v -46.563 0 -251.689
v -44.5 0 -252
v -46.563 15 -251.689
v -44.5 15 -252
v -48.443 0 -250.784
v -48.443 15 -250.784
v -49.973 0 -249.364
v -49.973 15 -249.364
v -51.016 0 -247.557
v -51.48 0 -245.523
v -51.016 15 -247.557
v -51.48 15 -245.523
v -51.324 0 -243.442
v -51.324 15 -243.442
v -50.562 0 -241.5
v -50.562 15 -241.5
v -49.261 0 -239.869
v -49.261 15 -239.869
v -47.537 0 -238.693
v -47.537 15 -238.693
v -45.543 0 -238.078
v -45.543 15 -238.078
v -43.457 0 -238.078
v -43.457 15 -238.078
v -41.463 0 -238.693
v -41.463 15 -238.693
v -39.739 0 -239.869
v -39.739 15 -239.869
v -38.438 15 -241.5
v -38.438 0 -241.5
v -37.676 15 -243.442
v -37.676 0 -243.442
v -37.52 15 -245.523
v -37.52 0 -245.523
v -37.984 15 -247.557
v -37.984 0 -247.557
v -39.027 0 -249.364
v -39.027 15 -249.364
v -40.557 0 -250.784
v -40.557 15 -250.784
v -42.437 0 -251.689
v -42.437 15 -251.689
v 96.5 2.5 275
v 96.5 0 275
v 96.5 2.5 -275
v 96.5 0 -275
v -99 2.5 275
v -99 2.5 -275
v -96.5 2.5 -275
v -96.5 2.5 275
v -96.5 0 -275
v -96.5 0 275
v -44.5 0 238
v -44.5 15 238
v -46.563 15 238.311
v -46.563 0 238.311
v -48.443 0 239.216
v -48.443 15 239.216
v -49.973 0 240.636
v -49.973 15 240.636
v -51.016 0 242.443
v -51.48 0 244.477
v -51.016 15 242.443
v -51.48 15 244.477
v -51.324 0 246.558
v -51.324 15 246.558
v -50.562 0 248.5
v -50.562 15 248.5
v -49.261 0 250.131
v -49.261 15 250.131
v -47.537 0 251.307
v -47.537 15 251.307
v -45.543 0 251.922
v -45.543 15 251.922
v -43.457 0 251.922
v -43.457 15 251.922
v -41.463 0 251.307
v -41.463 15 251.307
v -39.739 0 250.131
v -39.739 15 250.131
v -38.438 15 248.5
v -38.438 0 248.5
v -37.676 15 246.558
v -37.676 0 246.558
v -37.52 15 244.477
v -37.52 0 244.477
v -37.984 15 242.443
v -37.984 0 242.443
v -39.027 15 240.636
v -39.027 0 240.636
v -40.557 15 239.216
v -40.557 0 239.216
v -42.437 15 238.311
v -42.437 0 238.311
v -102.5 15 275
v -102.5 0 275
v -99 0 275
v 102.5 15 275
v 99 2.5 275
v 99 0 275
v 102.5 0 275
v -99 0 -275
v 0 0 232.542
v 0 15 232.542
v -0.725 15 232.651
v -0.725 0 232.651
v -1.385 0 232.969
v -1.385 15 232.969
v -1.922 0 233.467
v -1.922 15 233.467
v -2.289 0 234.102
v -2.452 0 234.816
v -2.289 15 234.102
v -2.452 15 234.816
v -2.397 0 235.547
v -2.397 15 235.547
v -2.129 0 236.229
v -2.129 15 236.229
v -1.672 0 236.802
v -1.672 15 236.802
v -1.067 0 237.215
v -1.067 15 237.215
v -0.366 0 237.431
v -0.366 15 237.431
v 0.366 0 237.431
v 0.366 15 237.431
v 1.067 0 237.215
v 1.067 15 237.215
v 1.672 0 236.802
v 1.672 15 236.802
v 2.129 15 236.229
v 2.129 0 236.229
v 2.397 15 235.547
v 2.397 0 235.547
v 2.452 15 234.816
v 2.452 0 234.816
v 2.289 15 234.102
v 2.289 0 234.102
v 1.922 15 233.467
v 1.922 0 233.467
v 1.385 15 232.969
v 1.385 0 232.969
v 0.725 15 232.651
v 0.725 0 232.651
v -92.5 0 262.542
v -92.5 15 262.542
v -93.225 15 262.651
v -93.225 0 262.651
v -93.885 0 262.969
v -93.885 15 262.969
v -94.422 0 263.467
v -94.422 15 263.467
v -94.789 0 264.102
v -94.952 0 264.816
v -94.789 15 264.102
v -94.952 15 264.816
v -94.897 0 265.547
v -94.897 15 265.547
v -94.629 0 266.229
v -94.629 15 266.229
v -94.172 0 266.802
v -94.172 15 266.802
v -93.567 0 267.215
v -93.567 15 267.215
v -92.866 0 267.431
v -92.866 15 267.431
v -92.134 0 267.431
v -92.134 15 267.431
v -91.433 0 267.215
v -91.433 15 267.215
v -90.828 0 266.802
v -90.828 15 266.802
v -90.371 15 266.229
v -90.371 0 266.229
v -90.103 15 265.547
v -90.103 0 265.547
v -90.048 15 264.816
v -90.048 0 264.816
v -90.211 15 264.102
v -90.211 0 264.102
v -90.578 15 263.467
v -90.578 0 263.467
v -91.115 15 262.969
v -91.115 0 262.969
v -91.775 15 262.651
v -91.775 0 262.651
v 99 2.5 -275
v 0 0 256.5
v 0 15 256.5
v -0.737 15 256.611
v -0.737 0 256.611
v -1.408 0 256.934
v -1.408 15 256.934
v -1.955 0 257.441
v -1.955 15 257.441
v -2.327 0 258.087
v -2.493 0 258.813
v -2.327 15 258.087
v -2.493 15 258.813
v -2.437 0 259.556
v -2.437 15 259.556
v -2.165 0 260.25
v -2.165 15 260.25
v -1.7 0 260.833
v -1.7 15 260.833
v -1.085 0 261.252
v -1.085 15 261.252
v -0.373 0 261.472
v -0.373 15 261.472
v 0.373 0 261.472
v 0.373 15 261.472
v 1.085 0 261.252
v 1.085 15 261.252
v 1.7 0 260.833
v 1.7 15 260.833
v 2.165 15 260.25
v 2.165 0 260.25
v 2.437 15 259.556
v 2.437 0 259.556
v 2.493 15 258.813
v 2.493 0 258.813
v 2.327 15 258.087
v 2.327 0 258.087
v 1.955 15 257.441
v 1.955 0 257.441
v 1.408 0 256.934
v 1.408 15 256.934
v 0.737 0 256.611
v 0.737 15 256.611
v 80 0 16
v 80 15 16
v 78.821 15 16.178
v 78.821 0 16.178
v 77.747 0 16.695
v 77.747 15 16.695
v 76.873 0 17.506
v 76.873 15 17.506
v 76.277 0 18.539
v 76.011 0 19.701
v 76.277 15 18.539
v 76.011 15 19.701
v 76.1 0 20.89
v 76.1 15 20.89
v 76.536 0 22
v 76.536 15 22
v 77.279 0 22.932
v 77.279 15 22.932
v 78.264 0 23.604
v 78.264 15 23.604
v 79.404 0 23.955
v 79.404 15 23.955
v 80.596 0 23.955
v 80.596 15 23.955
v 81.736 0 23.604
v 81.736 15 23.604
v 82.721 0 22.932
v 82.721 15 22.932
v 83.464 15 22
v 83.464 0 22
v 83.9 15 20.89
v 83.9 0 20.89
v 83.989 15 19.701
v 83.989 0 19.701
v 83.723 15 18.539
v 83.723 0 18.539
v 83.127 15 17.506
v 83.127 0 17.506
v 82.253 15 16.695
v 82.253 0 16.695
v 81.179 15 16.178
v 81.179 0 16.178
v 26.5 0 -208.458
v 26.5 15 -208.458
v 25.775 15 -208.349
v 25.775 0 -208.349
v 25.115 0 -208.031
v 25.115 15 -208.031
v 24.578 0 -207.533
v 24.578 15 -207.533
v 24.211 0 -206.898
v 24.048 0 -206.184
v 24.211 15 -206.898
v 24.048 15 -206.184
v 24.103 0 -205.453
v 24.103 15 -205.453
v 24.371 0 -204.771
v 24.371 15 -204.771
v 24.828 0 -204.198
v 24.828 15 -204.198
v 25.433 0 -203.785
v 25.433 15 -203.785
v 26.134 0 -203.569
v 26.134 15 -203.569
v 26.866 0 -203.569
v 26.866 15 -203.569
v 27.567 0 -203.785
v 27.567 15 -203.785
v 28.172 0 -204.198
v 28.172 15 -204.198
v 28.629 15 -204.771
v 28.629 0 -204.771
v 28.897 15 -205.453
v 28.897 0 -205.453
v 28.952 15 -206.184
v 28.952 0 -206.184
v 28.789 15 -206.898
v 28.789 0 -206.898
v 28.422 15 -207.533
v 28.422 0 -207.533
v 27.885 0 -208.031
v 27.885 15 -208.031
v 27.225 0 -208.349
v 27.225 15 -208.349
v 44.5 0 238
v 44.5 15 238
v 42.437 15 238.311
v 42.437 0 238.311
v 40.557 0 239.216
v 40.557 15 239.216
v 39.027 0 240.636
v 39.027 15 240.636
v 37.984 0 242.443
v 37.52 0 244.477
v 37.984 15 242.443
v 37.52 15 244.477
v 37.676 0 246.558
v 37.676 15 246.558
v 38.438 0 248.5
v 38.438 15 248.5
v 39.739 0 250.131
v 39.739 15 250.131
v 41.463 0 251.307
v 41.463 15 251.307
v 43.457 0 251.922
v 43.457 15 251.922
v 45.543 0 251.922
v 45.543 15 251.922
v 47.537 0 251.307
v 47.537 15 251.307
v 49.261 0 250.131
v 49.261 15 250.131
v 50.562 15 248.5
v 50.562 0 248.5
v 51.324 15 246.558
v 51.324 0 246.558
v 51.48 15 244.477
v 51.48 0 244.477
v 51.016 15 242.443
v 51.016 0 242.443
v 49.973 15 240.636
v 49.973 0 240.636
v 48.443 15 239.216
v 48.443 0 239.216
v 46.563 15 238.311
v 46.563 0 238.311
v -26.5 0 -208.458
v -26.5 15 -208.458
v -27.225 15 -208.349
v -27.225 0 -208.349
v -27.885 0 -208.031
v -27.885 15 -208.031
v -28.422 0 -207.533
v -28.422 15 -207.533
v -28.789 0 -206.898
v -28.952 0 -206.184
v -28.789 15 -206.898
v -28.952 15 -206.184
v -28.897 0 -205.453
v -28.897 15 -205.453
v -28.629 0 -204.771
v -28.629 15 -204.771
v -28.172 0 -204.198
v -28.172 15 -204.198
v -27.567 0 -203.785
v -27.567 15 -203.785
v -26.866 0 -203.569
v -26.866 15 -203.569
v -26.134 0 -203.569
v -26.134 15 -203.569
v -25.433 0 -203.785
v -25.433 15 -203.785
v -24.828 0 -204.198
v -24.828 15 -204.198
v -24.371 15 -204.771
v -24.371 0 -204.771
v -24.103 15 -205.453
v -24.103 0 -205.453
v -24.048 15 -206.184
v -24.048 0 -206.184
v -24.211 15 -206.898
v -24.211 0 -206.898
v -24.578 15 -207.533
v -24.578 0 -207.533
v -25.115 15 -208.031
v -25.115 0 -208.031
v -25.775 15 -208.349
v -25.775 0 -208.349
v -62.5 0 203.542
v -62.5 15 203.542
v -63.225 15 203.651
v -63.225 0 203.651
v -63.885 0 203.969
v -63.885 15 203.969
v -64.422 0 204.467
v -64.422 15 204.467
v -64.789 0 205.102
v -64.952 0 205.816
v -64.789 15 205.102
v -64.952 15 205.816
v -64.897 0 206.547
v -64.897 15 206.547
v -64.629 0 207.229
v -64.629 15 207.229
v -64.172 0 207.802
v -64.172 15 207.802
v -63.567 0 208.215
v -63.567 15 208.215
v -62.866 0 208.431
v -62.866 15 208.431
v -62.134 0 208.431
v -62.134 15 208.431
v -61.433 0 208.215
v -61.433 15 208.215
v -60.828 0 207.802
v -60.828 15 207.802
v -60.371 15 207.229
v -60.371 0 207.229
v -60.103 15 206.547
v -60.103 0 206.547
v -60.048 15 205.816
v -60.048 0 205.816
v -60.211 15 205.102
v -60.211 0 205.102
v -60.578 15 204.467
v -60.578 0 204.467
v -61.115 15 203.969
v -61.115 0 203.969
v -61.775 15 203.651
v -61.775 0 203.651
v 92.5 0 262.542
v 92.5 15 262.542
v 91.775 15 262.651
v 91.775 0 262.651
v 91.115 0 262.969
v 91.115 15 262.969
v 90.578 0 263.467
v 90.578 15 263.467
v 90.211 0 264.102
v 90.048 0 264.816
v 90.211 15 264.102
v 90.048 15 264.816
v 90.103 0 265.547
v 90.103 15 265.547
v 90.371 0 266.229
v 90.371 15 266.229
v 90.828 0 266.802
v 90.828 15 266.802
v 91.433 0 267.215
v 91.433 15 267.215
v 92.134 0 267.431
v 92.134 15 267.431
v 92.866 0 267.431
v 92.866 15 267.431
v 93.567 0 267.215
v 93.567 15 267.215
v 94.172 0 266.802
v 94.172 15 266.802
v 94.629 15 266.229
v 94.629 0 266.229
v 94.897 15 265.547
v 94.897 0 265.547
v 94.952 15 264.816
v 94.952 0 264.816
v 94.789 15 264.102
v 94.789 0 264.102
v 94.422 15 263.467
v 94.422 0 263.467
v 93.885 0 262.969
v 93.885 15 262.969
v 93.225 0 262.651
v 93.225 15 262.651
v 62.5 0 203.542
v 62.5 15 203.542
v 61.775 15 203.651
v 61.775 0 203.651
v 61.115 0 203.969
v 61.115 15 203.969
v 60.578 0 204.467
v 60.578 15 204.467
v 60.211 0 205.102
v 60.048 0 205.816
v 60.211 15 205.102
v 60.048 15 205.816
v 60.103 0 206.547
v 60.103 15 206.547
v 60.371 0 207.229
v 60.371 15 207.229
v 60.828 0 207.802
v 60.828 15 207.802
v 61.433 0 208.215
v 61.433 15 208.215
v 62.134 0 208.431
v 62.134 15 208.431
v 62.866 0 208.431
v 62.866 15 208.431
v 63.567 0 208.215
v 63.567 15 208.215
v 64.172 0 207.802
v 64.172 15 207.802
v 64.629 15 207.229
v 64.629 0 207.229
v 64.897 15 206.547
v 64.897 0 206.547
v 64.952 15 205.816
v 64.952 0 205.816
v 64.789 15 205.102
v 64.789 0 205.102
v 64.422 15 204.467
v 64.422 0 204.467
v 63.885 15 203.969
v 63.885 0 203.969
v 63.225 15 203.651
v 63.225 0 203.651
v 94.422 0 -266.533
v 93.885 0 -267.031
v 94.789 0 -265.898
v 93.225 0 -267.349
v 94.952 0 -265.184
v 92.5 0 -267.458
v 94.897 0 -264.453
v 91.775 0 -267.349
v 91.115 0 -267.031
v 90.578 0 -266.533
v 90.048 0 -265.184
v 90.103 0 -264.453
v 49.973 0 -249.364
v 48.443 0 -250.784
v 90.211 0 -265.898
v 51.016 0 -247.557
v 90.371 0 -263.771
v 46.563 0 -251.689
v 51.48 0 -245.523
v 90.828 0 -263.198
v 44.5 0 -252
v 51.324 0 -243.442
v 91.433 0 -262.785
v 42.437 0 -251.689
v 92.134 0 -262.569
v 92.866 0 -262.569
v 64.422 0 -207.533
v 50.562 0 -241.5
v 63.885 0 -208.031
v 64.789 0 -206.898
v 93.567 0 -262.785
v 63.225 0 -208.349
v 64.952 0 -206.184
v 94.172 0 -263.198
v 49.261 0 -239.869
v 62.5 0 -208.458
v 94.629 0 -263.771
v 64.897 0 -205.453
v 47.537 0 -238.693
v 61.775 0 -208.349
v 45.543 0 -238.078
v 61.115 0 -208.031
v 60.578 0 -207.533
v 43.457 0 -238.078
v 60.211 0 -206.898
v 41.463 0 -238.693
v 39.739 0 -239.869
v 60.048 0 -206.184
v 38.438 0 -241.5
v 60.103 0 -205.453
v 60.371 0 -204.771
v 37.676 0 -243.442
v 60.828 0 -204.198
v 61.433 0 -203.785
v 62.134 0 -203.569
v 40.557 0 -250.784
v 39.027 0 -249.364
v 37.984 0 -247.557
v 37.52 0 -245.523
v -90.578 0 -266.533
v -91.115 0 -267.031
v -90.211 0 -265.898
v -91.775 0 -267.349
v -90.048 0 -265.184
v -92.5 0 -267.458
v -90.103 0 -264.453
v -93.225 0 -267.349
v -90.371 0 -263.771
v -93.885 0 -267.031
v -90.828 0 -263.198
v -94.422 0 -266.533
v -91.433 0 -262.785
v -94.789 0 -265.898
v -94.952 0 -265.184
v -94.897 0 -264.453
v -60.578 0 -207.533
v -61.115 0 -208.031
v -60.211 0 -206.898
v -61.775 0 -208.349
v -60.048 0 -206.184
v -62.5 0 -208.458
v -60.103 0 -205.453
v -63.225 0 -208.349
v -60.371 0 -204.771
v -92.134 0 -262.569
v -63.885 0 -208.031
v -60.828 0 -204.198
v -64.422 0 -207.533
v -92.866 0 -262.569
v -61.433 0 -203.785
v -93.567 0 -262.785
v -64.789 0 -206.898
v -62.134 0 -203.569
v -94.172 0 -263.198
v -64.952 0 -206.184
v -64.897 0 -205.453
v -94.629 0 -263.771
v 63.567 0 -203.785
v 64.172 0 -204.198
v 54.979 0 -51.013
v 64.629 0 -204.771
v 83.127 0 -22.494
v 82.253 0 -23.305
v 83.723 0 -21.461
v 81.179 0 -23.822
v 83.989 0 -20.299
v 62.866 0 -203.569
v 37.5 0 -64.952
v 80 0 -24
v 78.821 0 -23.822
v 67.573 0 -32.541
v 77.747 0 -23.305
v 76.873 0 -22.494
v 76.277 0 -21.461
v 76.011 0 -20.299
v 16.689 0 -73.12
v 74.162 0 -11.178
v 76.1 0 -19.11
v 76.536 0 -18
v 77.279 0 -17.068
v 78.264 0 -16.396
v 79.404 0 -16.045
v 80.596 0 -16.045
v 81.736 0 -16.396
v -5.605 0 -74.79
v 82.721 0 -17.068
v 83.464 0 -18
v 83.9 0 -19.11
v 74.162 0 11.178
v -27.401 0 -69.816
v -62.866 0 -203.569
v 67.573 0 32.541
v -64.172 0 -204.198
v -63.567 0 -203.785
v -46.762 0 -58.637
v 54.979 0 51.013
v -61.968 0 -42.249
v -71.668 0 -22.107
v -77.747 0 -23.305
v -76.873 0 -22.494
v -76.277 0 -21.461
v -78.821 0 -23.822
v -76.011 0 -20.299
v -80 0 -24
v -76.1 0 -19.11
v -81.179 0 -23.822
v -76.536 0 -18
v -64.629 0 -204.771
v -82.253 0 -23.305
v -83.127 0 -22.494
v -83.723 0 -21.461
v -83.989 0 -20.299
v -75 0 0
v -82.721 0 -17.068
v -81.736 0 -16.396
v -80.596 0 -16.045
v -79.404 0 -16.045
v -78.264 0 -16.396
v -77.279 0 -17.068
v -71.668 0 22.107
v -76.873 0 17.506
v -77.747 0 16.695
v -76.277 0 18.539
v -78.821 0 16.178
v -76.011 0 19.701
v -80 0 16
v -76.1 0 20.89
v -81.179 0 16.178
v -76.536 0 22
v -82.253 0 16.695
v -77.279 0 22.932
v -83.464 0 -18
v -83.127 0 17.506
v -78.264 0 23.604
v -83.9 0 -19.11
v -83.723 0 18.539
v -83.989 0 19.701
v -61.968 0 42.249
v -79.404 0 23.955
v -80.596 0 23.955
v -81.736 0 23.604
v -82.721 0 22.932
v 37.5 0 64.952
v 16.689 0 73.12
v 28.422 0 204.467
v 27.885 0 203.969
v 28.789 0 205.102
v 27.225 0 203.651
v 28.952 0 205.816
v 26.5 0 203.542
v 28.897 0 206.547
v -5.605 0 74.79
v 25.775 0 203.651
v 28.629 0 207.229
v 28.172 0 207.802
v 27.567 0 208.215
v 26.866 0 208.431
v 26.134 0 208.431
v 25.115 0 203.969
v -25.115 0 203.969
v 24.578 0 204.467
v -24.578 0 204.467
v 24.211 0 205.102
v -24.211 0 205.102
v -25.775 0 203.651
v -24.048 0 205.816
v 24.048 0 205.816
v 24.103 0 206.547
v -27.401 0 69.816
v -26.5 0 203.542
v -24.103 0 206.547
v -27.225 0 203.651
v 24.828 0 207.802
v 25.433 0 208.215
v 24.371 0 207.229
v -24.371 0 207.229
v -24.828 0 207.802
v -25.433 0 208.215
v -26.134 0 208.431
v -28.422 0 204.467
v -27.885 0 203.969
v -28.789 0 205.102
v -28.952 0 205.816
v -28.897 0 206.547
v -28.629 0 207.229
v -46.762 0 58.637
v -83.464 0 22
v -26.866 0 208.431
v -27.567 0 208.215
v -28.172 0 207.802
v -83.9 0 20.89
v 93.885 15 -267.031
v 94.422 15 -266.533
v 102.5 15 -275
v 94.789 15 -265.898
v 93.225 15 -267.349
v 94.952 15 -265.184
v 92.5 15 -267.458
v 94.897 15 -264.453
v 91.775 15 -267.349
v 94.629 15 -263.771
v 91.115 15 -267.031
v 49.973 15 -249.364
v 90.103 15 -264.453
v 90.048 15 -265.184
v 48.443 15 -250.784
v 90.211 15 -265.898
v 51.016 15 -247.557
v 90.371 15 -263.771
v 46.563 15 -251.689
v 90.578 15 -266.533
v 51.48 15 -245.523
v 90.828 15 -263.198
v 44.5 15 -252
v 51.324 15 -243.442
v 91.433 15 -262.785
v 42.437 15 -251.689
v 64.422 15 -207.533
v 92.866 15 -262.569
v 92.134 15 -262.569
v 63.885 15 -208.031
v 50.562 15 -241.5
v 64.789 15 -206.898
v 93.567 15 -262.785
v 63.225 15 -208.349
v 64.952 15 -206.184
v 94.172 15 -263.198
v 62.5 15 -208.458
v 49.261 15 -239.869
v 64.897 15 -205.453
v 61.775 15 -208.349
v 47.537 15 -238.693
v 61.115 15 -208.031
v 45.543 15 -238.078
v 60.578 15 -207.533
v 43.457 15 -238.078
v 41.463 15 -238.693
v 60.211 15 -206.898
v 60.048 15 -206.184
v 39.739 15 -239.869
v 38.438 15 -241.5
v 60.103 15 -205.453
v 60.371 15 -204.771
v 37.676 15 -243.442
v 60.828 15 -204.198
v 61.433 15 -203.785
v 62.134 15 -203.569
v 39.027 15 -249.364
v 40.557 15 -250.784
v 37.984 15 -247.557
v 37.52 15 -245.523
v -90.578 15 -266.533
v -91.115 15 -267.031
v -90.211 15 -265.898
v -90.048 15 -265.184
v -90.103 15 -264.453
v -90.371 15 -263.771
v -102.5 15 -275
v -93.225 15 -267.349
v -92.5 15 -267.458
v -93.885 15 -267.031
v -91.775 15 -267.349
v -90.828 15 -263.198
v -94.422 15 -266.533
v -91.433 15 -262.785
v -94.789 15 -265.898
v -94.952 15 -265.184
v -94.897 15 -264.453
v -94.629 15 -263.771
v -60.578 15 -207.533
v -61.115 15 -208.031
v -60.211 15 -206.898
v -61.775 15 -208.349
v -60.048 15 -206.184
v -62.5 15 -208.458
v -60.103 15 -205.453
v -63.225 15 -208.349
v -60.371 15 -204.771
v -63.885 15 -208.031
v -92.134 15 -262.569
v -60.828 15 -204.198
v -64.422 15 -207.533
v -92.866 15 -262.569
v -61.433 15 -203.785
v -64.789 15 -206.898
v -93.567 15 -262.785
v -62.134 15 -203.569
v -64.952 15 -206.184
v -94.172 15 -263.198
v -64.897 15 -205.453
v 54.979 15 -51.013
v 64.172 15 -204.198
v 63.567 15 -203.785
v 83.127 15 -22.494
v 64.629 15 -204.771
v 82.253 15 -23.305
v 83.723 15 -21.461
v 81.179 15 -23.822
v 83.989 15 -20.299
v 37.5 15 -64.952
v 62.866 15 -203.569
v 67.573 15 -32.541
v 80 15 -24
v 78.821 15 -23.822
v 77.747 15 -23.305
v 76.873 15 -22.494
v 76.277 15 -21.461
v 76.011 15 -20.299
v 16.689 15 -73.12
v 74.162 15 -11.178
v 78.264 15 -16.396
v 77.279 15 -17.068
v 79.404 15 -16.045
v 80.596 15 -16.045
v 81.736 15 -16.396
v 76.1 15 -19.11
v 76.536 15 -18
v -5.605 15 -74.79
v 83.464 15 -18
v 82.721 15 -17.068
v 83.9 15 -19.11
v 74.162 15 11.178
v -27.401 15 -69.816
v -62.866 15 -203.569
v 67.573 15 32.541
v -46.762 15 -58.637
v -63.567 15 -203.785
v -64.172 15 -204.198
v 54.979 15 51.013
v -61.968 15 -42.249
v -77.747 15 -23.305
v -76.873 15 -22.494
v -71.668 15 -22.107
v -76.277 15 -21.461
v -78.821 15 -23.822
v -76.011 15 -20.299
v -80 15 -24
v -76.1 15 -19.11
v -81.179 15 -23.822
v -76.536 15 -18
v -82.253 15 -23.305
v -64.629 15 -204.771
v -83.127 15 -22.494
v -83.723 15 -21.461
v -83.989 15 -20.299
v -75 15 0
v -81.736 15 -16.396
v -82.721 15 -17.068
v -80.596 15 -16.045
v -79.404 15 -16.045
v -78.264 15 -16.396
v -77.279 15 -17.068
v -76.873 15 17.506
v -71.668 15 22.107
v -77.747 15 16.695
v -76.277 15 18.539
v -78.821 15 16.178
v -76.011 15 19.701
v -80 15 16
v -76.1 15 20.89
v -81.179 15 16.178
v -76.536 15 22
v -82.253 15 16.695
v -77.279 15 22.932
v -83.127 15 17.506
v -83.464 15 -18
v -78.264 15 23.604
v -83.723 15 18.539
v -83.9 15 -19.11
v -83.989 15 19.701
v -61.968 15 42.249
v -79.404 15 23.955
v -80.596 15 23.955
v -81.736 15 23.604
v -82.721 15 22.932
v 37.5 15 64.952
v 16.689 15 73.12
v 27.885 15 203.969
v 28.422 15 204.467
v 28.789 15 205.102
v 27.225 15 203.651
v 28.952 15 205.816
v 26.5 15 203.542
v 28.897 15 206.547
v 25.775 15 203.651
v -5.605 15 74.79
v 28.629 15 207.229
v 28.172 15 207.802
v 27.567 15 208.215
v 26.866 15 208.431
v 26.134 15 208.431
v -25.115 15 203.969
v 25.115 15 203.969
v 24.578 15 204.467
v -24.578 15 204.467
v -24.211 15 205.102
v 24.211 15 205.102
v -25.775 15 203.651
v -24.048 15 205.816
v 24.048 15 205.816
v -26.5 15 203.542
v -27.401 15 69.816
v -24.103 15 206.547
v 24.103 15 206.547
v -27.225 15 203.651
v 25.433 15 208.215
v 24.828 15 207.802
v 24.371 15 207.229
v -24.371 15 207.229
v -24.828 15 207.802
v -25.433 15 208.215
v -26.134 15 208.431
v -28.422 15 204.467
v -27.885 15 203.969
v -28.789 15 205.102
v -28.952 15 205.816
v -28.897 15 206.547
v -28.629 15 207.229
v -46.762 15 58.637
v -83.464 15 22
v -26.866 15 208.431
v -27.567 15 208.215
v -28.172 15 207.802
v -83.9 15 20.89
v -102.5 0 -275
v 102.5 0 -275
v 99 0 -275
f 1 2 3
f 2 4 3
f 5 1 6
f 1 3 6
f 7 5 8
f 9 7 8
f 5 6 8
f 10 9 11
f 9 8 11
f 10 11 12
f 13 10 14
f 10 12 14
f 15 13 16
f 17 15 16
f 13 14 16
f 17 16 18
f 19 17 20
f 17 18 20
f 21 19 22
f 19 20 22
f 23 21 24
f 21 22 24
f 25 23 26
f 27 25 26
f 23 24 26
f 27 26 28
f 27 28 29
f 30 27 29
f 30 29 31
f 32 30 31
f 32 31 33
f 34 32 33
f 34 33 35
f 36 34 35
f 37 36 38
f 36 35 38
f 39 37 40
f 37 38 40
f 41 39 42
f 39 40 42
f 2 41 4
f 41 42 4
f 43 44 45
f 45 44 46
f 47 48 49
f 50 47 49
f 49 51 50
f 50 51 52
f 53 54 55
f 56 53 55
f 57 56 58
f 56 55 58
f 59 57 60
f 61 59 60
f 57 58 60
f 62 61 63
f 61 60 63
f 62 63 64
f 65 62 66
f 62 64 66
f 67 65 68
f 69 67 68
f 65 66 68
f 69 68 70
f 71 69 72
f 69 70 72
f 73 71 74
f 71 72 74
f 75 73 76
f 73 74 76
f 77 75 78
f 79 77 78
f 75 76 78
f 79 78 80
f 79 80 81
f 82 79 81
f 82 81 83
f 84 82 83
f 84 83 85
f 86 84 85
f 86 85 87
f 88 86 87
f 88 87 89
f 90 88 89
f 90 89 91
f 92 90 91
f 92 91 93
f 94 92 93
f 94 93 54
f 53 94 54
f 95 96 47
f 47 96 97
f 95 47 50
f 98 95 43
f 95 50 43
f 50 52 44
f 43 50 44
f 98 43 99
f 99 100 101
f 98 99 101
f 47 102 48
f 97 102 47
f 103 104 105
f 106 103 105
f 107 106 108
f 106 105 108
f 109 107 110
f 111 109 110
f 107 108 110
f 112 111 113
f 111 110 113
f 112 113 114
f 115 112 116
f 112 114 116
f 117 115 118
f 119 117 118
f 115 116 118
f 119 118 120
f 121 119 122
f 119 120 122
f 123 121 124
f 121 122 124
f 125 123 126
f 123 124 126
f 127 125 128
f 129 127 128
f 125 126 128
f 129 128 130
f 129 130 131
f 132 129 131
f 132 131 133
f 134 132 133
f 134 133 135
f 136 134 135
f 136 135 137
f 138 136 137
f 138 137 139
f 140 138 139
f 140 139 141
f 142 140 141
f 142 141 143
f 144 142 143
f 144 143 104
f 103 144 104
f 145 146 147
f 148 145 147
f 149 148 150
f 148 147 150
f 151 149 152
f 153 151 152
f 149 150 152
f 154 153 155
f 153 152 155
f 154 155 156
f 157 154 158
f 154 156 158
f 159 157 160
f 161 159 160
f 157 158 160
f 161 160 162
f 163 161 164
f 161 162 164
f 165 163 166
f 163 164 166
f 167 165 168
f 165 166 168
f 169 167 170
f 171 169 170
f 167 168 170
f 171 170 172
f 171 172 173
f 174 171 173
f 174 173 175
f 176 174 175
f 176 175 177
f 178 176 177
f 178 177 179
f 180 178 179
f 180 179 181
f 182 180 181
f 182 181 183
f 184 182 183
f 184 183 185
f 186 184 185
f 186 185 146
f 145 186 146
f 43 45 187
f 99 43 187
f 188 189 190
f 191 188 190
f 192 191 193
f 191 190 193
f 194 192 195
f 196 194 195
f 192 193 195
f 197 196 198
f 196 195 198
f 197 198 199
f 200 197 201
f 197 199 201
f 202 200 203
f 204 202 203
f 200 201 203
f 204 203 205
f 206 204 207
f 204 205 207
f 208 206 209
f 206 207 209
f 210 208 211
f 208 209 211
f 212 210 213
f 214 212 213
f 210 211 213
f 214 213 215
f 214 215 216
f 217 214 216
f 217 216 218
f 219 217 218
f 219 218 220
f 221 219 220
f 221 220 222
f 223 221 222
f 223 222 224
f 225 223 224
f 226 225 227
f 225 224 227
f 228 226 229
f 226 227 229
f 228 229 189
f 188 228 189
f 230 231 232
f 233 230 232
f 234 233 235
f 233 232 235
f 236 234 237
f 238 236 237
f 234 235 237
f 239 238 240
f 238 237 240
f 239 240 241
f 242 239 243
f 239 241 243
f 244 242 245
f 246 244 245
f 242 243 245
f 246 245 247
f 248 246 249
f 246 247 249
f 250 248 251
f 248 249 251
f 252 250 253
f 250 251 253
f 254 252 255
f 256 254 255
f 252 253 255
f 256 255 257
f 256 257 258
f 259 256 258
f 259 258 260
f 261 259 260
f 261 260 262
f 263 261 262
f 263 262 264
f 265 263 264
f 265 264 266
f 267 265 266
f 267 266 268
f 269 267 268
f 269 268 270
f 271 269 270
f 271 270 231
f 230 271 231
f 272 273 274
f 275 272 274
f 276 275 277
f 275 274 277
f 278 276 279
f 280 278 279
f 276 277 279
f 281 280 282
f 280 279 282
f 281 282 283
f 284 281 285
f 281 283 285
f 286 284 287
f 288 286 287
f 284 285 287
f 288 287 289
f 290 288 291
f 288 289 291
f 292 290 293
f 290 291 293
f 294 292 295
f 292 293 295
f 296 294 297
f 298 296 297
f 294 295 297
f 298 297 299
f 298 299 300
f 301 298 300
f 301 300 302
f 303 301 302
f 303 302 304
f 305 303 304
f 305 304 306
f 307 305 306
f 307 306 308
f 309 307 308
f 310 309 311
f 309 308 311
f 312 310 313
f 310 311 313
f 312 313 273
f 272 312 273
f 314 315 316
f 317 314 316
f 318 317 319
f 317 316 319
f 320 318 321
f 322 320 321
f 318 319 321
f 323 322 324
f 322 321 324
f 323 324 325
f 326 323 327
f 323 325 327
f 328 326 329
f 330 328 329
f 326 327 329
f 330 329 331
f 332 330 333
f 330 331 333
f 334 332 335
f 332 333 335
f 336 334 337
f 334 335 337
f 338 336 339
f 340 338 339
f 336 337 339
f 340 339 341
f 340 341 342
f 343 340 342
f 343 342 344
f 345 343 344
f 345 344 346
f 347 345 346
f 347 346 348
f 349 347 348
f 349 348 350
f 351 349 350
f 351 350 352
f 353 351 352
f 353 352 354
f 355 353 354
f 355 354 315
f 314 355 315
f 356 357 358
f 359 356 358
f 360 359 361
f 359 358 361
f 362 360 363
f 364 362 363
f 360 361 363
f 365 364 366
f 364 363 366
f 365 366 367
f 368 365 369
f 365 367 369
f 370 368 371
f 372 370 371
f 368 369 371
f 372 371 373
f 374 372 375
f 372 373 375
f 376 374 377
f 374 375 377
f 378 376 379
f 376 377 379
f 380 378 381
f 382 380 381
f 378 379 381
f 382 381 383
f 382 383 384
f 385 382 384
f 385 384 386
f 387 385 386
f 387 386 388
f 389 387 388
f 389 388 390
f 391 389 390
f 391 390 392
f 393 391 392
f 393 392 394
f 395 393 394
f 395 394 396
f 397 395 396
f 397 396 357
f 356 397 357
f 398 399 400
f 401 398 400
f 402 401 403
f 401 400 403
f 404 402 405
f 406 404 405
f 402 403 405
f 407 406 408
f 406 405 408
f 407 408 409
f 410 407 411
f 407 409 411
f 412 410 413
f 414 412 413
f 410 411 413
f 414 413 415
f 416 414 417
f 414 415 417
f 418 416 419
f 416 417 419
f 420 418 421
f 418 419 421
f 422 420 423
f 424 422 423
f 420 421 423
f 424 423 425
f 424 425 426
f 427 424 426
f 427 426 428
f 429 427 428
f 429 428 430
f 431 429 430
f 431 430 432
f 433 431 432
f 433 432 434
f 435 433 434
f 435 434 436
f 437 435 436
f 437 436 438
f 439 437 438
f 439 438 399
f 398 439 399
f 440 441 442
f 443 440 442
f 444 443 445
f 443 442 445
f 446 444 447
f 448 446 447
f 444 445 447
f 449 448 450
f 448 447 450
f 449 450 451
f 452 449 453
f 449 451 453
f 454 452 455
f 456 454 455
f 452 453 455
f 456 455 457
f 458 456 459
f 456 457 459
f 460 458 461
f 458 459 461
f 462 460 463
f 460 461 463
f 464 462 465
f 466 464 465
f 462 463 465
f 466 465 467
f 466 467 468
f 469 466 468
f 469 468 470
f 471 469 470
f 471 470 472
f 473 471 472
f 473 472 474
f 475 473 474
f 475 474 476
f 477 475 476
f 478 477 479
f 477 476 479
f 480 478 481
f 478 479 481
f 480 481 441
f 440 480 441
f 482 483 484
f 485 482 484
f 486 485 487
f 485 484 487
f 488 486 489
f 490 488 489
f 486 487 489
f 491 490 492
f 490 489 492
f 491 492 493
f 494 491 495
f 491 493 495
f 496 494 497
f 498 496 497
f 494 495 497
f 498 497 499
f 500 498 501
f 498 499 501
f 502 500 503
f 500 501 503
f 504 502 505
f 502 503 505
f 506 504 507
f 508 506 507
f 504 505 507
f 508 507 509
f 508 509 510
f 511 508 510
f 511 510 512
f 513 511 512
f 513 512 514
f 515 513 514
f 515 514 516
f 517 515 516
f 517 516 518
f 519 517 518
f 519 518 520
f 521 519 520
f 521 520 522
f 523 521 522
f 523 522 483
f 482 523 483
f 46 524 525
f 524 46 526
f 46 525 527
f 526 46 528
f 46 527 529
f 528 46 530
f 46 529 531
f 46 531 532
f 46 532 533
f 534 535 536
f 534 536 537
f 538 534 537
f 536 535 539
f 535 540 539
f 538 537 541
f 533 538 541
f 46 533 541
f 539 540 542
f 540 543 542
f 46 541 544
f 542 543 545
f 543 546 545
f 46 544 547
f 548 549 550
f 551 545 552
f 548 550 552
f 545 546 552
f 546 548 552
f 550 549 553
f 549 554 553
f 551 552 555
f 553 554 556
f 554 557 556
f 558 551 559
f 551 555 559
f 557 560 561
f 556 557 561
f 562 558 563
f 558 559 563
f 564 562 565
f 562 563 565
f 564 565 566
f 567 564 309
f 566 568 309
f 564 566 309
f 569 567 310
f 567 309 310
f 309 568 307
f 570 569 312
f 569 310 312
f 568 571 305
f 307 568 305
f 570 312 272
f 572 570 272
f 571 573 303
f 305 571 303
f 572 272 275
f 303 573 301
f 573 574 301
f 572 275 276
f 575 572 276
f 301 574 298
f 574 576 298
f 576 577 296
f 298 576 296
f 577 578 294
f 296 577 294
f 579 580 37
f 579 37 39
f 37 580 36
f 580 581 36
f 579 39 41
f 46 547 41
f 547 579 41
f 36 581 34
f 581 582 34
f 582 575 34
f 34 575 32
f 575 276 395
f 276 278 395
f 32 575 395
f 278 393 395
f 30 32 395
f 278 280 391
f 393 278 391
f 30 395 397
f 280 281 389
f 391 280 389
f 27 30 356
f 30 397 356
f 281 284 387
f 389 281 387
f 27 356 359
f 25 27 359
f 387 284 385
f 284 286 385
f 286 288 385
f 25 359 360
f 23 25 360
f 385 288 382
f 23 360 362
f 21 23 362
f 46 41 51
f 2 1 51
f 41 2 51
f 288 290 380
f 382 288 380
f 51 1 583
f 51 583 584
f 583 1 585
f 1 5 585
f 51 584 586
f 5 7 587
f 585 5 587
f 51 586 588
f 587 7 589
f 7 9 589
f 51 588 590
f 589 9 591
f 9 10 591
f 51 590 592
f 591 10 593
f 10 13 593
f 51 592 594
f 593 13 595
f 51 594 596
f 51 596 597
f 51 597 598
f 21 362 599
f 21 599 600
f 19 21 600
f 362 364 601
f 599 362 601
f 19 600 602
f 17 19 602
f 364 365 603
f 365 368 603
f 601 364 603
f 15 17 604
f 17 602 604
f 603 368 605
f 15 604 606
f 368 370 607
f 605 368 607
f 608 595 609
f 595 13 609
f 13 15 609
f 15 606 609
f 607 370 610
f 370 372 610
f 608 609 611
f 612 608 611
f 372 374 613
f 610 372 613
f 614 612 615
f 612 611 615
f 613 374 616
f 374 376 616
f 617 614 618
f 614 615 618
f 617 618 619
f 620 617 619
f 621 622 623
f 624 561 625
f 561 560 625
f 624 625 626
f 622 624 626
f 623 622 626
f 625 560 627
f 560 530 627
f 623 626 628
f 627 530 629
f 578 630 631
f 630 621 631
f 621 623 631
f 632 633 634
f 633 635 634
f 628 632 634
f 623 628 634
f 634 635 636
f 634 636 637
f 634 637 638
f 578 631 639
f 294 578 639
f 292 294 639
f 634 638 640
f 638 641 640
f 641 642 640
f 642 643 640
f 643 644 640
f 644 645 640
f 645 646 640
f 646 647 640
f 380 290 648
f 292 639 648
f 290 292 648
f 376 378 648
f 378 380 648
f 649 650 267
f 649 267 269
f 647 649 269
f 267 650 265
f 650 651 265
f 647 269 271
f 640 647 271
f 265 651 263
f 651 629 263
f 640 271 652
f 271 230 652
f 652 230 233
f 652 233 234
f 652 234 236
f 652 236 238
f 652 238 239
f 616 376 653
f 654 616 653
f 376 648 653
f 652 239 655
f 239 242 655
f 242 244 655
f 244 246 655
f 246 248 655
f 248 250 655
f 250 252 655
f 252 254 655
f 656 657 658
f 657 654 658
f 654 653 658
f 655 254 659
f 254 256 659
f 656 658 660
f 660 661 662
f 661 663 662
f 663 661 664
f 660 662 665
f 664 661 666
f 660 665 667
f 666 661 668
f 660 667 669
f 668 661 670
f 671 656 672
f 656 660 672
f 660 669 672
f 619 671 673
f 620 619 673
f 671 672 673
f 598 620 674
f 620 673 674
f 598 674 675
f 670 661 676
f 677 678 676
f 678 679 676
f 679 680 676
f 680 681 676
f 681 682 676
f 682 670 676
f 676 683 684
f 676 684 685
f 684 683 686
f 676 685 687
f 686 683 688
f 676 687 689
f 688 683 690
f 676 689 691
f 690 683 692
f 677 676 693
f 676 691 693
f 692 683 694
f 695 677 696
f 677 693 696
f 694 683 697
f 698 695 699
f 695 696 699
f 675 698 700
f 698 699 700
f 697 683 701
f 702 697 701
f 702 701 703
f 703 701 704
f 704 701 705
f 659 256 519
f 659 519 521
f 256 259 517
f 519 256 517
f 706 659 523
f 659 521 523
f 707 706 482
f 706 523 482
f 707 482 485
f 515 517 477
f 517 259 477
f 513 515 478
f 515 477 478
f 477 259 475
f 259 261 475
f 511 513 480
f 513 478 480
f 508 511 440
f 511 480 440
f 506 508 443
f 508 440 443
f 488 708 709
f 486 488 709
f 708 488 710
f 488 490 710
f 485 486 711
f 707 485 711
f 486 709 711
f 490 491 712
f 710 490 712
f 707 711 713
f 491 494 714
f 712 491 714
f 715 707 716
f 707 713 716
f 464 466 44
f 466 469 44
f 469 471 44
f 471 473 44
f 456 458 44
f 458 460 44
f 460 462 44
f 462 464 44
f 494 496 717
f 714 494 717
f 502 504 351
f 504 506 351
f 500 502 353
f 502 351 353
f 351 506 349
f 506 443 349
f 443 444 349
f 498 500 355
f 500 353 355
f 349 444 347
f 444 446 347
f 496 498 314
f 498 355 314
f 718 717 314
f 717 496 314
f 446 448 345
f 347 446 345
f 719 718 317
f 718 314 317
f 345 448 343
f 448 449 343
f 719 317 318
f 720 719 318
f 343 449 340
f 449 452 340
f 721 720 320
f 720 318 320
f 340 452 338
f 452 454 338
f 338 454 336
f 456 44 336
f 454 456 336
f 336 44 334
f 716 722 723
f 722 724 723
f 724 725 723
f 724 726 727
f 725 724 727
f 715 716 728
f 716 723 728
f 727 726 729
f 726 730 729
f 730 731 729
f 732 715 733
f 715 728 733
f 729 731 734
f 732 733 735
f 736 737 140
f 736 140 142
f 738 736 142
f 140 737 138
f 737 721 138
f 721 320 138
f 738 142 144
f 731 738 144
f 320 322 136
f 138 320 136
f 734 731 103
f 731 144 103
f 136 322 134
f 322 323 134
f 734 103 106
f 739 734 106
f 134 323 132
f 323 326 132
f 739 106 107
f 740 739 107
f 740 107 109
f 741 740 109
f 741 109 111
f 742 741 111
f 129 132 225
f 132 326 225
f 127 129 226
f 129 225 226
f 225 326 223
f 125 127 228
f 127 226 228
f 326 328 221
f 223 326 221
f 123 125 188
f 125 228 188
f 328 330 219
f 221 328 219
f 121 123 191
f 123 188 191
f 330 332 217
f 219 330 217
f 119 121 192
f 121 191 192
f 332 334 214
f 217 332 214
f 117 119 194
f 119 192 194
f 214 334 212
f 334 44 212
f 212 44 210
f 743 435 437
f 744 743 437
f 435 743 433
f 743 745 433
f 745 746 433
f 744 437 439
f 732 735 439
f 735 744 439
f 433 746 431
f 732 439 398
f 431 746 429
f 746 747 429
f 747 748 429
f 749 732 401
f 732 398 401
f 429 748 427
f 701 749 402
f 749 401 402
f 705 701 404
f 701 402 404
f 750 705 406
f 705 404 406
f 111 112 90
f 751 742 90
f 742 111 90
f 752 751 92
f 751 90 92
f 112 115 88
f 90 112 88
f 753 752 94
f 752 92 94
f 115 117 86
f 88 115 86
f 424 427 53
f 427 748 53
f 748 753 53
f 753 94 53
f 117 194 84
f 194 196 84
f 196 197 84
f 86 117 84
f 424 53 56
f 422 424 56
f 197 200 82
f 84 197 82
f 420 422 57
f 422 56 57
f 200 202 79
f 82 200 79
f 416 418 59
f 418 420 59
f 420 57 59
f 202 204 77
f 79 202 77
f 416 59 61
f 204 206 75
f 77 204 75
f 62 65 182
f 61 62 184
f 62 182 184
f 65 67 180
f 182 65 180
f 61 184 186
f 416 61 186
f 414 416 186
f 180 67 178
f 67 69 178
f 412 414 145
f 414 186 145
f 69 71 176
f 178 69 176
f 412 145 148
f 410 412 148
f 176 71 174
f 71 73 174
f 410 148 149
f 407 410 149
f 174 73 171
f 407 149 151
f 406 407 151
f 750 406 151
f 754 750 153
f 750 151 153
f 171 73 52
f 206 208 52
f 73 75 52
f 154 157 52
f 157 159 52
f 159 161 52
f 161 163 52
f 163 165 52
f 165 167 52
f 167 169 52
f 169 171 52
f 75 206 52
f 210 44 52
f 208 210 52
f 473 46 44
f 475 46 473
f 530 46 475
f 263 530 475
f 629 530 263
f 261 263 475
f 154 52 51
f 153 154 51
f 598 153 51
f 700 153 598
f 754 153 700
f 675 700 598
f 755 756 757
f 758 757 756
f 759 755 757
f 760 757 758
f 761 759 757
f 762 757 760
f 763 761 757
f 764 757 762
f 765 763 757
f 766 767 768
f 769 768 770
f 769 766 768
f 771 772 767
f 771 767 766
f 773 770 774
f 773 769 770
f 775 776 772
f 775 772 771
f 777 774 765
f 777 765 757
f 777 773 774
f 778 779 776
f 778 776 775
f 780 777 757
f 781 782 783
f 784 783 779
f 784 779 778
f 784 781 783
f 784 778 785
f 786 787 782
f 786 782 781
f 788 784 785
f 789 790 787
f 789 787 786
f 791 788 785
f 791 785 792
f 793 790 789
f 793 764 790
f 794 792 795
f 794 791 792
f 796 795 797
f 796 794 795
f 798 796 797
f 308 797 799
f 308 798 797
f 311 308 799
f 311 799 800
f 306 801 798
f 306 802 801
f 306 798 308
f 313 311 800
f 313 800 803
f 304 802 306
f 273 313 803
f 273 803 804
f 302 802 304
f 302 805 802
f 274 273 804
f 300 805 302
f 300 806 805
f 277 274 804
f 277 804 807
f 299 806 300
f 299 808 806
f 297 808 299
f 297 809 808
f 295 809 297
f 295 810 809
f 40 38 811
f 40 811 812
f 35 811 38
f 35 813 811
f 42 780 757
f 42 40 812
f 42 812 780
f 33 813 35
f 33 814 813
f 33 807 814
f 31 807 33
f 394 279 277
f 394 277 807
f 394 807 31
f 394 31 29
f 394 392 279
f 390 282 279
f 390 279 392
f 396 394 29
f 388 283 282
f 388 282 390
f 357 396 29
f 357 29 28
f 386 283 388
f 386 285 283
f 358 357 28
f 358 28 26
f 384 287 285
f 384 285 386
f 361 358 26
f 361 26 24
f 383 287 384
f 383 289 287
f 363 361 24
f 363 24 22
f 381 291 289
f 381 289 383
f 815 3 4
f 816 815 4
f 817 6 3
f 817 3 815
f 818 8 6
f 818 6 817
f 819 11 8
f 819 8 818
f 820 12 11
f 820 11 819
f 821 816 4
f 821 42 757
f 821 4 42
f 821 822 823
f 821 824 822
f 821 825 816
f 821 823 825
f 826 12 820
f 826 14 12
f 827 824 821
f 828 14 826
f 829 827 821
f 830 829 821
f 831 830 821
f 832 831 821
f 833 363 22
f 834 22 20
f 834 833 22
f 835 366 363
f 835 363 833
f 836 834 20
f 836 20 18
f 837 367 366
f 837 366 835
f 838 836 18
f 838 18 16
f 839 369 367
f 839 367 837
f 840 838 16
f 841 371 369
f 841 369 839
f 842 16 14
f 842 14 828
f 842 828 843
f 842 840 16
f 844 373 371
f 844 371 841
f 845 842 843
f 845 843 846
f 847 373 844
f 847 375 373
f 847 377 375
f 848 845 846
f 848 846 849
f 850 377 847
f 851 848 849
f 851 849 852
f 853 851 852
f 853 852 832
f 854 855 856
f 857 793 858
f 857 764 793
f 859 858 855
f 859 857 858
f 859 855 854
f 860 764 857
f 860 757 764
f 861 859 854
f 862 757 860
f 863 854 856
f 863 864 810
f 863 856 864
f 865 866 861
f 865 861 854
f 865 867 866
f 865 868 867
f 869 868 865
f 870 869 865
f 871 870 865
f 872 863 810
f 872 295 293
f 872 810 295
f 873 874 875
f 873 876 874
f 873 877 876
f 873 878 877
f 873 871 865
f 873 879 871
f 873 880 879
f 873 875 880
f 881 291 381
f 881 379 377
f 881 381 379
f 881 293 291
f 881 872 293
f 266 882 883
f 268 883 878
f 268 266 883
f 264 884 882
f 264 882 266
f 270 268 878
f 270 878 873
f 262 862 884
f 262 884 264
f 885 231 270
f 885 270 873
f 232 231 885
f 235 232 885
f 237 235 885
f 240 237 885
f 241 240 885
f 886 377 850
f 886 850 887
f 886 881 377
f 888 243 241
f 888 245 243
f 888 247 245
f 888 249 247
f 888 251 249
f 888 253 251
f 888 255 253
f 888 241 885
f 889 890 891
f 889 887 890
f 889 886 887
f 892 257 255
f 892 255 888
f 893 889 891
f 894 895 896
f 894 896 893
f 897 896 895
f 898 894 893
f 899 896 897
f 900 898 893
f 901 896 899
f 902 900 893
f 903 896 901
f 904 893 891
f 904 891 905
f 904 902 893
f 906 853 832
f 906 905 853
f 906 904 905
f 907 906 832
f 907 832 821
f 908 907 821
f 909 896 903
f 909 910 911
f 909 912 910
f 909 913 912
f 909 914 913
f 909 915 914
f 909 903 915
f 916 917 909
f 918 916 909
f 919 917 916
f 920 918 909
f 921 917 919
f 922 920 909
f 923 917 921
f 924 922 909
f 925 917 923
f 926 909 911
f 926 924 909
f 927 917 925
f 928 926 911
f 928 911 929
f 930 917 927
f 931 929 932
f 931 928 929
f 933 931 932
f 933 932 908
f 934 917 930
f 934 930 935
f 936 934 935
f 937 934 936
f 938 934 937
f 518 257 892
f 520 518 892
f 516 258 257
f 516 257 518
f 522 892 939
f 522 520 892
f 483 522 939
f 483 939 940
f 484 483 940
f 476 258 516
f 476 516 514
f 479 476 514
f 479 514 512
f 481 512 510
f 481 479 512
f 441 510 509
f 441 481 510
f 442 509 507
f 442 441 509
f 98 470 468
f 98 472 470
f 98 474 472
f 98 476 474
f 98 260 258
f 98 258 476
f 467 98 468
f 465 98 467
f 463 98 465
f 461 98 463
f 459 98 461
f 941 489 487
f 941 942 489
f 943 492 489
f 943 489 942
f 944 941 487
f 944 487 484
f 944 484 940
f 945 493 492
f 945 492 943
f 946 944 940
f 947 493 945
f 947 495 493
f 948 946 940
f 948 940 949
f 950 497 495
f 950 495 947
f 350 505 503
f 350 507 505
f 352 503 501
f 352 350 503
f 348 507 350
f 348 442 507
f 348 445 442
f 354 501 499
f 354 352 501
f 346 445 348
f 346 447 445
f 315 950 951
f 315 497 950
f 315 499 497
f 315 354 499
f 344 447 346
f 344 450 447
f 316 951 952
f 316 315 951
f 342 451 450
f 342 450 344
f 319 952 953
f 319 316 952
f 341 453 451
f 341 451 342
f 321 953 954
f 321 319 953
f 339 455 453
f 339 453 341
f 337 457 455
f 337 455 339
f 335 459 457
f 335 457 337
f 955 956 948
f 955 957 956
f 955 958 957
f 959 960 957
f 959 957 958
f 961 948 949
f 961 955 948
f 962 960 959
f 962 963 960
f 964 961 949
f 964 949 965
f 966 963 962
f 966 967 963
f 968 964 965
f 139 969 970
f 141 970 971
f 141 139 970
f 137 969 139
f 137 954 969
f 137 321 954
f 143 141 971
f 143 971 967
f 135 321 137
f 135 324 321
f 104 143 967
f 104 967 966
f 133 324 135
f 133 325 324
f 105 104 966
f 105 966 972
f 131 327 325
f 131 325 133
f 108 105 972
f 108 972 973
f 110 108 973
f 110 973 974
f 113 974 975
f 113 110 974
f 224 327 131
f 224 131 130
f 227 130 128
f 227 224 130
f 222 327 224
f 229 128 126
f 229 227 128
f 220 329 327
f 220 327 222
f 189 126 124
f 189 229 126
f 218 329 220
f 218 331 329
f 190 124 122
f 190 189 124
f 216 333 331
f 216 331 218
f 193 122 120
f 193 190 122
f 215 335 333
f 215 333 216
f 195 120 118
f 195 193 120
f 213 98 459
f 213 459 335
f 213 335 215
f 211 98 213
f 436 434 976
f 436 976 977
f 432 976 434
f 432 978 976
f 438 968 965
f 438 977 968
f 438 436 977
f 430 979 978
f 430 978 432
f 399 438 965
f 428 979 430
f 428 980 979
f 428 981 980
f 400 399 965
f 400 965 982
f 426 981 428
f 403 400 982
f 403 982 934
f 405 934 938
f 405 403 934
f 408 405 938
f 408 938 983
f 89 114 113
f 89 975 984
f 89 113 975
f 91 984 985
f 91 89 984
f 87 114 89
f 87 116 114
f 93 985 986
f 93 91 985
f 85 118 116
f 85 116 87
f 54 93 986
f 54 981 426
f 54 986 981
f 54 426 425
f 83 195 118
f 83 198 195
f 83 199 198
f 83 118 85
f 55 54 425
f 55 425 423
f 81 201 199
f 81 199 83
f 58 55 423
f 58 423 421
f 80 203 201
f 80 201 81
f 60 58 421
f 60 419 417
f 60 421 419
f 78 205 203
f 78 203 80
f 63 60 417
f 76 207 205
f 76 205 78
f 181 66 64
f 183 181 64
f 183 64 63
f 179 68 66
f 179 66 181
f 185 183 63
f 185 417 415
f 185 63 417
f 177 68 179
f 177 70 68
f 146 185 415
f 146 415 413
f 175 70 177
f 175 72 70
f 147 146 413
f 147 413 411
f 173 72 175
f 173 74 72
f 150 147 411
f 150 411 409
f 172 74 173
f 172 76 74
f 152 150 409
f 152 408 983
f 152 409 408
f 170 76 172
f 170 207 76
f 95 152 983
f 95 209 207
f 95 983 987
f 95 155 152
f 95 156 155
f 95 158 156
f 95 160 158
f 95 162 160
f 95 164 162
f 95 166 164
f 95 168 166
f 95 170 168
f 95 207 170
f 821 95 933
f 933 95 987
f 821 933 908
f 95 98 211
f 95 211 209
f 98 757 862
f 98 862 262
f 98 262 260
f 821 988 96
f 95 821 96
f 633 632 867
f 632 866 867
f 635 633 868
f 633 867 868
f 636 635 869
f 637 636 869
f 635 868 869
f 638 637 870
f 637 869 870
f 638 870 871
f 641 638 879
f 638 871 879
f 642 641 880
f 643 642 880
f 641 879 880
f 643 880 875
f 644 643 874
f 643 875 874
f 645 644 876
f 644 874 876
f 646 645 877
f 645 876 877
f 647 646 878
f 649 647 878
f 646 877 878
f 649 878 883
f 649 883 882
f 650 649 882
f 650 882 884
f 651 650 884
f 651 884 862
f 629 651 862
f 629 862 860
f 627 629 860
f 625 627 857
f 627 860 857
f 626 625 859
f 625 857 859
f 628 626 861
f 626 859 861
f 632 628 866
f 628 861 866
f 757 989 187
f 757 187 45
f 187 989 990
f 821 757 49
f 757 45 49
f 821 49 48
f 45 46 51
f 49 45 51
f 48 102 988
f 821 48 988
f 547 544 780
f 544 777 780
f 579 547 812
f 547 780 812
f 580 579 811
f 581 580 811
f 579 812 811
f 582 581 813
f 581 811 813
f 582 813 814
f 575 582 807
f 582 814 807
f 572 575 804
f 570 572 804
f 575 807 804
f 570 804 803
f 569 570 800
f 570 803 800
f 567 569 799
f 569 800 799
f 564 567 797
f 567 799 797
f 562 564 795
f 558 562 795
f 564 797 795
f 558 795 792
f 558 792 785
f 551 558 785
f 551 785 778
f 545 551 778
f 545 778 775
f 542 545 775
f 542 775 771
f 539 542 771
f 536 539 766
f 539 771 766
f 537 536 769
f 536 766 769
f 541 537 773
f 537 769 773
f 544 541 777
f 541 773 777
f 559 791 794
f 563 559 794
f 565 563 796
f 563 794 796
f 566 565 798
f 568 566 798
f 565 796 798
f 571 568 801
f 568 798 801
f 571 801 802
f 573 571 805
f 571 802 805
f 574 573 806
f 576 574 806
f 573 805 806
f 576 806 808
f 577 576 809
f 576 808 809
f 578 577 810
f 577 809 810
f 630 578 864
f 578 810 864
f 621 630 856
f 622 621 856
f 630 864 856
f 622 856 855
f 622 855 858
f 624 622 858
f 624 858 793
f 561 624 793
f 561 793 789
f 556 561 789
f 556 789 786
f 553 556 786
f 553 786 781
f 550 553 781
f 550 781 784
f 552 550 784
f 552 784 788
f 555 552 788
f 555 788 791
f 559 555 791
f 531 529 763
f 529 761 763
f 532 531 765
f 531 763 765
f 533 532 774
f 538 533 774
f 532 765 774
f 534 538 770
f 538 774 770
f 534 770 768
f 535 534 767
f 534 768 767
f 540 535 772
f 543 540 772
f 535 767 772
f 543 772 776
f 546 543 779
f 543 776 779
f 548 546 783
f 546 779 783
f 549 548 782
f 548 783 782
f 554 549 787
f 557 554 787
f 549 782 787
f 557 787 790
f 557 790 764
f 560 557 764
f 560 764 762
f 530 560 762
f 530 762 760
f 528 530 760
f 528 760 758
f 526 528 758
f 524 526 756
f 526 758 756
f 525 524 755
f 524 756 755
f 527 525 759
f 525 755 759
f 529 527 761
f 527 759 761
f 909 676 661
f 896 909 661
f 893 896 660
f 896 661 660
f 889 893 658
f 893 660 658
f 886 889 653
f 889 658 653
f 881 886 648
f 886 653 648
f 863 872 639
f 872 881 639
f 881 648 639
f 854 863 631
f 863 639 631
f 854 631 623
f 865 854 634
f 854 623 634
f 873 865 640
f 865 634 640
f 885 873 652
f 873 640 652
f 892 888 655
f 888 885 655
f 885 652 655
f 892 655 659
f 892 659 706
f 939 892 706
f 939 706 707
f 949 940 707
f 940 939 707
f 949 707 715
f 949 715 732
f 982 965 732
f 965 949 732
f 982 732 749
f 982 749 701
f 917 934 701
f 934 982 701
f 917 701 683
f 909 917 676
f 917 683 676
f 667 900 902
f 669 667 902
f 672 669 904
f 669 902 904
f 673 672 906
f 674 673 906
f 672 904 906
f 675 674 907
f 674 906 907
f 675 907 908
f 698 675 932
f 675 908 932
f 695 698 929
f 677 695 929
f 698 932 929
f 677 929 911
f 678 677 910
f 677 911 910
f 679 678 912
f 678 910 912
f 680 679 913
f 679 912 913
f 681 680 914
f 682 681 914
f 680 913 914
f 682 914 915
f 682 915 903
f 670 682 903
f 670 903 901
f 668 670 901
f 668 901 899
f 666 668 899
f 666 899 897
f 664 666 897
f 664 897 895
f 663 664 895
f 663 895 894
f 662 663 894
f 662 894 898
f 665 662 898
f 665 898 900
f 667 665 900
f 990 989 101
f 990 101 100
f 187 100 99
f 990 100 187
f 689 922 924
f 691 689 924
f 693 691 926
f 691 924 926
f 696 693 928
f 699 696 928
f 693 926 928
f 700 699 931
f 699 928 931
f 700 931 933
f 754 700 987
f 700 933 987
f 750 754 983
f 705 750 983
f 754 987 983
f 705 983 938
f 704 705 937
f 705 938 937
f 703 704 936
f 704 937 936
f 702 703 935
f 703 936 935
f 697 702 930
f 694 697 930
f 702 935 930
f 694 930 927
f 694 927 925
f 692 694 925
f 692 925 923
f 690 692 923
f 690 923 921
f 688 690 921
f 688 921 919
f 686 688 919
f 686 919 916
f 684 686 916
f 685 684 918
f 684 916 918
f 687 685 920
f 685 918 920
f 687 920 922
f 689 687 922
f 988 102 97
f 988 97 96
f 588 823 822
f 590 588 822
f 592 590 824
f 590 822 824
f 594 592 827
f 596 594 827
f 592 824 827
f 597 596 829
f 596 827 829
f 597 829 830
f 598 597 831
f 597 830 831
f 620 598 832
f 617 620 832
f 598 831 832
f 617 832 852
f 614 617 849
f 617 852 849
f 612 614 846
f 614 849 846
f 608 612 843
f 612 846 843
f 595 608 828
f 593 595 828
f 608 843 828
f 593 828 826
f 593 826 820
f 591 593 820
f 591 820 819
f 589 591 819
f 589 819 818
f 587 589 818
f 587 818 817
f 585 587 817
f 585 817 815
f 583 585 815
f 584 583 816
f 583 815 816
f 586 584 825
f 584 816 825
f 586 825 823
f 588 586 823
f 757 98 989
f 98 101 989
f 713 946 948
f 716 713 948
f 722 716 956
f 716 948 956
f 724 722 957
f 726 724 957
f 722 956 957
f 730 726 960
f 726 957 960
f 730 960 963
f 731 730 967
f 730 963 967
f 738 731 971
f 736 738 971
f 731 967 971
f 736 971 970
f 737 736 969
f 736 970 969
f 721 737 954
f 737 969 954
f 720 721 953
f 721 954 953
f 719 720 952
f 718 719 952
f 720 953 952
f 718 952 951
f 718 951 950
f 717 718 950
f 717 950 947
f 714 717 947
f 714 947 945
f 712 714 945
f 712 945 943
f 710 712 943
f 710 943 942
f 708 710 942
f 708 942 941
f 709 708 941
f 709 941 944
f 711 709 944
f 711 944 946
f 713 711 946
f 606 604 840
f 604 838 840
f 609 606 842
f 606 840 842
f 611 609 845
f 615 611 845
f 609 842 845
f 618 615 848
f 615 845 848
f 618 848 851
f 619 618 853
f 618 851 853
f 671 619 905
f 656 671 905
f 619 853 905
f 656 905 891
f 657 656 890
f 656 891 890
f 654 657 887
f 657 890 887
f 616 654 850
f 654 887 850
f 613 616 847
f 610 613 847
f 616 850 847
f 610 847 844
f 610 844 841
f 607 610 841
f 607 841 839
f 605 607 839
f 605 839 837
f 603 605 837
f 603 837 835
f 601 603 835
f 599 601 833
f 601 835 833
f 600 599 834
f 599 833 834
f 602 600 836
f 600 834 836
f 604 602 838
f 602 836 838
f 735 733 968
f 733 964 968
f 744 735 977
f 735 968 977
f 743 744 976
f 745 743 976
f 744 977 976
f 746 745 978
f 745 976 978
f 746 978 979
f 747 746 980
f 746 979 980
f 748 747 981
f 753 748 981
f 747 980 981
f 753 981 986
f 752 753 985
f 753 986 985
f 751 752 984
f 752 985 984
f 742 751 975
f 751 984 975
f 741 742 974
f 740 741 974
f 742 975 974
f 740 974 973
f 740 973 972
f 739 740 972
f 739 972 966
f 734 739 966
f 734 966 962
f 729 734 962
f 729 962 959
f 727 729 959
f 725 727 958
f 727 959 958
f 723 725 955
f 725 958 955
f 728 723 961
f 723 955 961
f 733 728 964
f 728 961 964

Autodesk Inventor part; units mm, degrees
ref_plane "YZ Plane" through (0, 0, 0) normal (1, 0, 0) x (0, 1, 0)
ref_plane "XZ Plane" through (0, 0, 0) normal (0, 1, 0) x (-1, 0, 0)
ref_plane "XY Plane" through (0, 0, 0) normal (0, 0, 1) x (1, 0, 0)
sketch "Skizze2" plane through (0, 0, 0) normal (0, 1, 0) x (-1, 0, 0)
  circle A0 centre (0, 0) radius 75
  line L0 (-102.5, -275) -> (102.5, -275)
  line L1 (102.5, -275) -> (102.5, 275)
  line L2 (102.5, 275) -> (-102.5, 275)
  line L3 (-102.5, 275) -> (-102.5, -275)
  line L4 (-102.5, -275) -> (102.5, 275) construction
  line L5 (102.5, -275) -> (-102.5, 275) construction
  dimension "d8" = 150
  dimension "d9" = 205
  dimension "d10" = 550
extrude "Extrusion1" add sketch "Skizze2" along normal blind 15
sketch "Skizze3" plane through (0, 0, 0) normal (0, -1, 0) x (1, 0, 0)
  line L0 (-92.5, -265) -> (92.5, -265)
  line L1 (92.5, -265) -> (92.5, 265)
  line L2 (92.5, 265) -> (-92.5, 265)
  line L3 (-92.5, 265) -> (-92.5, -265)
  line L4 (-92.5, -265) -> (92.5, 265) construction
  line L5 (92.5, -265) -> (-92.5, 265) construction
  line L6 (-102.5, -275) -> (-102.5, 275) projected
  line L7 (102.5, 275) -> (102.5, -275) projected
  point P0 (0, 0)
  dimension "d13" = 185
  dimension "d14" = 530
  dimension "d86" = 205
hole "Bohrung1" at (92.5, 0, -265) at (-92.5, 0, -265) at (-92.5, 0, 265) at (92.5, 0, 265) direction (0, 1, 0) diameter 4.917 end through all thread size "M6x1" class "6H" standard "ISO Metric profile"
sketch "Skizze6" plane through (0, 0, 0) normal (0, -1, 0) x (1, 0, 0)
  line L0 (99, 275) -> (99, -275)
  line L1 (102.5, 275) -> (102.5, -275) projected
  line L2 (96.5, 275) -> (96.5, -275)
  line L3 (-99, -275) -> (-99, 275)
  line L4 (-96.5, -275) -> (-96.5, 275)
  line L5 (102.5, -275) -> (-102.5, -275) projected
  line L6 (96.5, -275) -> (99, -275)
  line L7 (-96.5, -275) -> (-99, -275)
  line L8 (-102.5, 275) -> (102.5, 275) projected
  line L9 (-96.5, 275) -> (-99, 275)
  line L10 (99, 275) -> (96.5, 275)
  line L11 (-102.5, -275) -> (-102.5, 275) projected
  point P0 (0, 0)
  point P1 (99, 275)
  point P2 (96.5, 275)
  dimension "d68" = 2.5
  dimension "d70" = 2.5
  dimension "d84" = 198
  dimension "d85" = 99
extrude "Extrusion2" cut sketch "Skizze6" against normal blind 2.5 contours L0 L5 L2 L8 | L4 L5 L3 L8
sketch "Skizze7" plane through (0, 0, 0) normal (0, -1, 0) x (1, 0, 0)
  line L0 (-80, -20) -> (80, -20)
  line L1 (80, -20) -> (80, 20)
  line L2 (80, 20) -> (-80, 20)
  line L3 (-80, 20) -> (-80, -20)
  line L4 (-80, -20) -> (80, 20) construction
  line L5 (80, -20) -> (-80, 20) construction
  point P0 (0, 0)
  dimension "d74" = 160
  dimension "d75" = 40
hole "Bohrung6" at (-80, 0, 20) at (-80, 0, -20) at (80, 0, -20) at (80, 0, 20) direction (0, 1, 0) diameter 8 end through all
sketch "Skizze8" plane through (0, 0, 0) normal (0, -1, 0) x (1, 0, 0)
  line L0 (-62.5, -206) -> (62.5, -206)
  line L1 (62.5, -206) -> (62.5, 206)
  line L2 (62.5, 206) -> (-62.5, 206)
  line L3 (-62.5, 206) -> (-62.5, -206)
  line L4 (-62.5, -206) -> (62.5, 206) construction
  line L5 (62.5, -206) -> (-62.5, 206) construction
  line L6 (-26.5, -206) -> (26.5, -206)
  line L7 (26.5, -206) -> (26.5, 206)
  line L8 (26.5, 206) -> (-26.5, 206)
  line L9 (-26.5, 206) -> (-26.5, -206)
  line L10 (-26.5, -206) -> (26.5, 206) construction
  line L11 (26.5, -206) -> (-26.5, 206) construction
  point P0 (0, 0)
  dimension "d87" = 125
  dimension "d88" = 412
  dimension "d89" = 53
  dimension "d90" = 412
hole "Bohrung7" at (-62.5, 0, 206) at (-26.5, 0, 206) at (26.5, 0, 206) at (62.5, 0, 206) at (62.5, 0, -206) at (26.5, 0, -206) at (-26.5, 0, -206) at (-62.5, 0, -206) direction (0, 1, 0) diameter 4.917 end through all thread size "M6x1" class "6H" standard "ISO Metric profile"
sketch "Skizze9" plane through (0, 0, 0) normal (0, -1, 0) x (1, 0, 0)
  line L0 (-44.5, -245) -> (44.5, -245)
  line L1 (44.5, -245) -> (44.5, 245)
  line L2 (44.5, 245) -> (-44.5, 245)
  line L3 (-44.5, 245) -> (-44.5, -245)
  line L4 (-44.5, -245) -> (44.5, 245) construction
  line L5 (44.5, -245) -> (-44.5, 245) construction
  line L6 (102.5, 275) -> (102.5, -275) projected
  point P0 (0, 0)
  dimension "d98" = 490
  dimension "d99" = 58
hole "Bohrung8" at (44.5, 0, 245) at (-44.5, 0, 245) at (-44.5, 0, -245) at (44.5, 0, -245) direction (0, 1, 0) diameter 14 end through all
sketch "Skizze10" plane through (0, 0, 0) normal (0, -1, 0) x (1, 0, 0)
  line L0 (-96.5, 275) -> (96.5, 275) projected
  line L1 (-102.5, -275) -> (-102.5, 275) projected
  point P0 (0, 0)
  point P1 (0, 235)
  point P2 (0, 259)
  dimension "d107" = 40
  dimension "d108" = 102.5
  dimension "d116" = 16
  dimension "d117" = 102.5
hole "Bohrung9" at (0, 0, 235) direction (0, 1, 0) diameter 4.917 end through all thread size "M6x1" class "6H" standard "ISO Metric profile"
sketch "Skizze11" plane through (0, 0, 0) normal (0, -1, 0) x (1, 0, 0)
  line L0 (-102.5, -275) -> (-102.5, 275) projected
  line L1 (-96.5, 275) -> (96.5, 275) projected
  point P0 (0, 0)
  point P1 (0, 259)
  dimension "d118" = 102.5
  dimension "d119" = 16
hole "Bohrung10" at (0, 0, 259) direction (0, 1, 0) diameter 5 end through all
equation "\"d70\" = d68"
equation "\"d85\" = 0.5 * d84"
properties part number "Grundplatte 2.0"
